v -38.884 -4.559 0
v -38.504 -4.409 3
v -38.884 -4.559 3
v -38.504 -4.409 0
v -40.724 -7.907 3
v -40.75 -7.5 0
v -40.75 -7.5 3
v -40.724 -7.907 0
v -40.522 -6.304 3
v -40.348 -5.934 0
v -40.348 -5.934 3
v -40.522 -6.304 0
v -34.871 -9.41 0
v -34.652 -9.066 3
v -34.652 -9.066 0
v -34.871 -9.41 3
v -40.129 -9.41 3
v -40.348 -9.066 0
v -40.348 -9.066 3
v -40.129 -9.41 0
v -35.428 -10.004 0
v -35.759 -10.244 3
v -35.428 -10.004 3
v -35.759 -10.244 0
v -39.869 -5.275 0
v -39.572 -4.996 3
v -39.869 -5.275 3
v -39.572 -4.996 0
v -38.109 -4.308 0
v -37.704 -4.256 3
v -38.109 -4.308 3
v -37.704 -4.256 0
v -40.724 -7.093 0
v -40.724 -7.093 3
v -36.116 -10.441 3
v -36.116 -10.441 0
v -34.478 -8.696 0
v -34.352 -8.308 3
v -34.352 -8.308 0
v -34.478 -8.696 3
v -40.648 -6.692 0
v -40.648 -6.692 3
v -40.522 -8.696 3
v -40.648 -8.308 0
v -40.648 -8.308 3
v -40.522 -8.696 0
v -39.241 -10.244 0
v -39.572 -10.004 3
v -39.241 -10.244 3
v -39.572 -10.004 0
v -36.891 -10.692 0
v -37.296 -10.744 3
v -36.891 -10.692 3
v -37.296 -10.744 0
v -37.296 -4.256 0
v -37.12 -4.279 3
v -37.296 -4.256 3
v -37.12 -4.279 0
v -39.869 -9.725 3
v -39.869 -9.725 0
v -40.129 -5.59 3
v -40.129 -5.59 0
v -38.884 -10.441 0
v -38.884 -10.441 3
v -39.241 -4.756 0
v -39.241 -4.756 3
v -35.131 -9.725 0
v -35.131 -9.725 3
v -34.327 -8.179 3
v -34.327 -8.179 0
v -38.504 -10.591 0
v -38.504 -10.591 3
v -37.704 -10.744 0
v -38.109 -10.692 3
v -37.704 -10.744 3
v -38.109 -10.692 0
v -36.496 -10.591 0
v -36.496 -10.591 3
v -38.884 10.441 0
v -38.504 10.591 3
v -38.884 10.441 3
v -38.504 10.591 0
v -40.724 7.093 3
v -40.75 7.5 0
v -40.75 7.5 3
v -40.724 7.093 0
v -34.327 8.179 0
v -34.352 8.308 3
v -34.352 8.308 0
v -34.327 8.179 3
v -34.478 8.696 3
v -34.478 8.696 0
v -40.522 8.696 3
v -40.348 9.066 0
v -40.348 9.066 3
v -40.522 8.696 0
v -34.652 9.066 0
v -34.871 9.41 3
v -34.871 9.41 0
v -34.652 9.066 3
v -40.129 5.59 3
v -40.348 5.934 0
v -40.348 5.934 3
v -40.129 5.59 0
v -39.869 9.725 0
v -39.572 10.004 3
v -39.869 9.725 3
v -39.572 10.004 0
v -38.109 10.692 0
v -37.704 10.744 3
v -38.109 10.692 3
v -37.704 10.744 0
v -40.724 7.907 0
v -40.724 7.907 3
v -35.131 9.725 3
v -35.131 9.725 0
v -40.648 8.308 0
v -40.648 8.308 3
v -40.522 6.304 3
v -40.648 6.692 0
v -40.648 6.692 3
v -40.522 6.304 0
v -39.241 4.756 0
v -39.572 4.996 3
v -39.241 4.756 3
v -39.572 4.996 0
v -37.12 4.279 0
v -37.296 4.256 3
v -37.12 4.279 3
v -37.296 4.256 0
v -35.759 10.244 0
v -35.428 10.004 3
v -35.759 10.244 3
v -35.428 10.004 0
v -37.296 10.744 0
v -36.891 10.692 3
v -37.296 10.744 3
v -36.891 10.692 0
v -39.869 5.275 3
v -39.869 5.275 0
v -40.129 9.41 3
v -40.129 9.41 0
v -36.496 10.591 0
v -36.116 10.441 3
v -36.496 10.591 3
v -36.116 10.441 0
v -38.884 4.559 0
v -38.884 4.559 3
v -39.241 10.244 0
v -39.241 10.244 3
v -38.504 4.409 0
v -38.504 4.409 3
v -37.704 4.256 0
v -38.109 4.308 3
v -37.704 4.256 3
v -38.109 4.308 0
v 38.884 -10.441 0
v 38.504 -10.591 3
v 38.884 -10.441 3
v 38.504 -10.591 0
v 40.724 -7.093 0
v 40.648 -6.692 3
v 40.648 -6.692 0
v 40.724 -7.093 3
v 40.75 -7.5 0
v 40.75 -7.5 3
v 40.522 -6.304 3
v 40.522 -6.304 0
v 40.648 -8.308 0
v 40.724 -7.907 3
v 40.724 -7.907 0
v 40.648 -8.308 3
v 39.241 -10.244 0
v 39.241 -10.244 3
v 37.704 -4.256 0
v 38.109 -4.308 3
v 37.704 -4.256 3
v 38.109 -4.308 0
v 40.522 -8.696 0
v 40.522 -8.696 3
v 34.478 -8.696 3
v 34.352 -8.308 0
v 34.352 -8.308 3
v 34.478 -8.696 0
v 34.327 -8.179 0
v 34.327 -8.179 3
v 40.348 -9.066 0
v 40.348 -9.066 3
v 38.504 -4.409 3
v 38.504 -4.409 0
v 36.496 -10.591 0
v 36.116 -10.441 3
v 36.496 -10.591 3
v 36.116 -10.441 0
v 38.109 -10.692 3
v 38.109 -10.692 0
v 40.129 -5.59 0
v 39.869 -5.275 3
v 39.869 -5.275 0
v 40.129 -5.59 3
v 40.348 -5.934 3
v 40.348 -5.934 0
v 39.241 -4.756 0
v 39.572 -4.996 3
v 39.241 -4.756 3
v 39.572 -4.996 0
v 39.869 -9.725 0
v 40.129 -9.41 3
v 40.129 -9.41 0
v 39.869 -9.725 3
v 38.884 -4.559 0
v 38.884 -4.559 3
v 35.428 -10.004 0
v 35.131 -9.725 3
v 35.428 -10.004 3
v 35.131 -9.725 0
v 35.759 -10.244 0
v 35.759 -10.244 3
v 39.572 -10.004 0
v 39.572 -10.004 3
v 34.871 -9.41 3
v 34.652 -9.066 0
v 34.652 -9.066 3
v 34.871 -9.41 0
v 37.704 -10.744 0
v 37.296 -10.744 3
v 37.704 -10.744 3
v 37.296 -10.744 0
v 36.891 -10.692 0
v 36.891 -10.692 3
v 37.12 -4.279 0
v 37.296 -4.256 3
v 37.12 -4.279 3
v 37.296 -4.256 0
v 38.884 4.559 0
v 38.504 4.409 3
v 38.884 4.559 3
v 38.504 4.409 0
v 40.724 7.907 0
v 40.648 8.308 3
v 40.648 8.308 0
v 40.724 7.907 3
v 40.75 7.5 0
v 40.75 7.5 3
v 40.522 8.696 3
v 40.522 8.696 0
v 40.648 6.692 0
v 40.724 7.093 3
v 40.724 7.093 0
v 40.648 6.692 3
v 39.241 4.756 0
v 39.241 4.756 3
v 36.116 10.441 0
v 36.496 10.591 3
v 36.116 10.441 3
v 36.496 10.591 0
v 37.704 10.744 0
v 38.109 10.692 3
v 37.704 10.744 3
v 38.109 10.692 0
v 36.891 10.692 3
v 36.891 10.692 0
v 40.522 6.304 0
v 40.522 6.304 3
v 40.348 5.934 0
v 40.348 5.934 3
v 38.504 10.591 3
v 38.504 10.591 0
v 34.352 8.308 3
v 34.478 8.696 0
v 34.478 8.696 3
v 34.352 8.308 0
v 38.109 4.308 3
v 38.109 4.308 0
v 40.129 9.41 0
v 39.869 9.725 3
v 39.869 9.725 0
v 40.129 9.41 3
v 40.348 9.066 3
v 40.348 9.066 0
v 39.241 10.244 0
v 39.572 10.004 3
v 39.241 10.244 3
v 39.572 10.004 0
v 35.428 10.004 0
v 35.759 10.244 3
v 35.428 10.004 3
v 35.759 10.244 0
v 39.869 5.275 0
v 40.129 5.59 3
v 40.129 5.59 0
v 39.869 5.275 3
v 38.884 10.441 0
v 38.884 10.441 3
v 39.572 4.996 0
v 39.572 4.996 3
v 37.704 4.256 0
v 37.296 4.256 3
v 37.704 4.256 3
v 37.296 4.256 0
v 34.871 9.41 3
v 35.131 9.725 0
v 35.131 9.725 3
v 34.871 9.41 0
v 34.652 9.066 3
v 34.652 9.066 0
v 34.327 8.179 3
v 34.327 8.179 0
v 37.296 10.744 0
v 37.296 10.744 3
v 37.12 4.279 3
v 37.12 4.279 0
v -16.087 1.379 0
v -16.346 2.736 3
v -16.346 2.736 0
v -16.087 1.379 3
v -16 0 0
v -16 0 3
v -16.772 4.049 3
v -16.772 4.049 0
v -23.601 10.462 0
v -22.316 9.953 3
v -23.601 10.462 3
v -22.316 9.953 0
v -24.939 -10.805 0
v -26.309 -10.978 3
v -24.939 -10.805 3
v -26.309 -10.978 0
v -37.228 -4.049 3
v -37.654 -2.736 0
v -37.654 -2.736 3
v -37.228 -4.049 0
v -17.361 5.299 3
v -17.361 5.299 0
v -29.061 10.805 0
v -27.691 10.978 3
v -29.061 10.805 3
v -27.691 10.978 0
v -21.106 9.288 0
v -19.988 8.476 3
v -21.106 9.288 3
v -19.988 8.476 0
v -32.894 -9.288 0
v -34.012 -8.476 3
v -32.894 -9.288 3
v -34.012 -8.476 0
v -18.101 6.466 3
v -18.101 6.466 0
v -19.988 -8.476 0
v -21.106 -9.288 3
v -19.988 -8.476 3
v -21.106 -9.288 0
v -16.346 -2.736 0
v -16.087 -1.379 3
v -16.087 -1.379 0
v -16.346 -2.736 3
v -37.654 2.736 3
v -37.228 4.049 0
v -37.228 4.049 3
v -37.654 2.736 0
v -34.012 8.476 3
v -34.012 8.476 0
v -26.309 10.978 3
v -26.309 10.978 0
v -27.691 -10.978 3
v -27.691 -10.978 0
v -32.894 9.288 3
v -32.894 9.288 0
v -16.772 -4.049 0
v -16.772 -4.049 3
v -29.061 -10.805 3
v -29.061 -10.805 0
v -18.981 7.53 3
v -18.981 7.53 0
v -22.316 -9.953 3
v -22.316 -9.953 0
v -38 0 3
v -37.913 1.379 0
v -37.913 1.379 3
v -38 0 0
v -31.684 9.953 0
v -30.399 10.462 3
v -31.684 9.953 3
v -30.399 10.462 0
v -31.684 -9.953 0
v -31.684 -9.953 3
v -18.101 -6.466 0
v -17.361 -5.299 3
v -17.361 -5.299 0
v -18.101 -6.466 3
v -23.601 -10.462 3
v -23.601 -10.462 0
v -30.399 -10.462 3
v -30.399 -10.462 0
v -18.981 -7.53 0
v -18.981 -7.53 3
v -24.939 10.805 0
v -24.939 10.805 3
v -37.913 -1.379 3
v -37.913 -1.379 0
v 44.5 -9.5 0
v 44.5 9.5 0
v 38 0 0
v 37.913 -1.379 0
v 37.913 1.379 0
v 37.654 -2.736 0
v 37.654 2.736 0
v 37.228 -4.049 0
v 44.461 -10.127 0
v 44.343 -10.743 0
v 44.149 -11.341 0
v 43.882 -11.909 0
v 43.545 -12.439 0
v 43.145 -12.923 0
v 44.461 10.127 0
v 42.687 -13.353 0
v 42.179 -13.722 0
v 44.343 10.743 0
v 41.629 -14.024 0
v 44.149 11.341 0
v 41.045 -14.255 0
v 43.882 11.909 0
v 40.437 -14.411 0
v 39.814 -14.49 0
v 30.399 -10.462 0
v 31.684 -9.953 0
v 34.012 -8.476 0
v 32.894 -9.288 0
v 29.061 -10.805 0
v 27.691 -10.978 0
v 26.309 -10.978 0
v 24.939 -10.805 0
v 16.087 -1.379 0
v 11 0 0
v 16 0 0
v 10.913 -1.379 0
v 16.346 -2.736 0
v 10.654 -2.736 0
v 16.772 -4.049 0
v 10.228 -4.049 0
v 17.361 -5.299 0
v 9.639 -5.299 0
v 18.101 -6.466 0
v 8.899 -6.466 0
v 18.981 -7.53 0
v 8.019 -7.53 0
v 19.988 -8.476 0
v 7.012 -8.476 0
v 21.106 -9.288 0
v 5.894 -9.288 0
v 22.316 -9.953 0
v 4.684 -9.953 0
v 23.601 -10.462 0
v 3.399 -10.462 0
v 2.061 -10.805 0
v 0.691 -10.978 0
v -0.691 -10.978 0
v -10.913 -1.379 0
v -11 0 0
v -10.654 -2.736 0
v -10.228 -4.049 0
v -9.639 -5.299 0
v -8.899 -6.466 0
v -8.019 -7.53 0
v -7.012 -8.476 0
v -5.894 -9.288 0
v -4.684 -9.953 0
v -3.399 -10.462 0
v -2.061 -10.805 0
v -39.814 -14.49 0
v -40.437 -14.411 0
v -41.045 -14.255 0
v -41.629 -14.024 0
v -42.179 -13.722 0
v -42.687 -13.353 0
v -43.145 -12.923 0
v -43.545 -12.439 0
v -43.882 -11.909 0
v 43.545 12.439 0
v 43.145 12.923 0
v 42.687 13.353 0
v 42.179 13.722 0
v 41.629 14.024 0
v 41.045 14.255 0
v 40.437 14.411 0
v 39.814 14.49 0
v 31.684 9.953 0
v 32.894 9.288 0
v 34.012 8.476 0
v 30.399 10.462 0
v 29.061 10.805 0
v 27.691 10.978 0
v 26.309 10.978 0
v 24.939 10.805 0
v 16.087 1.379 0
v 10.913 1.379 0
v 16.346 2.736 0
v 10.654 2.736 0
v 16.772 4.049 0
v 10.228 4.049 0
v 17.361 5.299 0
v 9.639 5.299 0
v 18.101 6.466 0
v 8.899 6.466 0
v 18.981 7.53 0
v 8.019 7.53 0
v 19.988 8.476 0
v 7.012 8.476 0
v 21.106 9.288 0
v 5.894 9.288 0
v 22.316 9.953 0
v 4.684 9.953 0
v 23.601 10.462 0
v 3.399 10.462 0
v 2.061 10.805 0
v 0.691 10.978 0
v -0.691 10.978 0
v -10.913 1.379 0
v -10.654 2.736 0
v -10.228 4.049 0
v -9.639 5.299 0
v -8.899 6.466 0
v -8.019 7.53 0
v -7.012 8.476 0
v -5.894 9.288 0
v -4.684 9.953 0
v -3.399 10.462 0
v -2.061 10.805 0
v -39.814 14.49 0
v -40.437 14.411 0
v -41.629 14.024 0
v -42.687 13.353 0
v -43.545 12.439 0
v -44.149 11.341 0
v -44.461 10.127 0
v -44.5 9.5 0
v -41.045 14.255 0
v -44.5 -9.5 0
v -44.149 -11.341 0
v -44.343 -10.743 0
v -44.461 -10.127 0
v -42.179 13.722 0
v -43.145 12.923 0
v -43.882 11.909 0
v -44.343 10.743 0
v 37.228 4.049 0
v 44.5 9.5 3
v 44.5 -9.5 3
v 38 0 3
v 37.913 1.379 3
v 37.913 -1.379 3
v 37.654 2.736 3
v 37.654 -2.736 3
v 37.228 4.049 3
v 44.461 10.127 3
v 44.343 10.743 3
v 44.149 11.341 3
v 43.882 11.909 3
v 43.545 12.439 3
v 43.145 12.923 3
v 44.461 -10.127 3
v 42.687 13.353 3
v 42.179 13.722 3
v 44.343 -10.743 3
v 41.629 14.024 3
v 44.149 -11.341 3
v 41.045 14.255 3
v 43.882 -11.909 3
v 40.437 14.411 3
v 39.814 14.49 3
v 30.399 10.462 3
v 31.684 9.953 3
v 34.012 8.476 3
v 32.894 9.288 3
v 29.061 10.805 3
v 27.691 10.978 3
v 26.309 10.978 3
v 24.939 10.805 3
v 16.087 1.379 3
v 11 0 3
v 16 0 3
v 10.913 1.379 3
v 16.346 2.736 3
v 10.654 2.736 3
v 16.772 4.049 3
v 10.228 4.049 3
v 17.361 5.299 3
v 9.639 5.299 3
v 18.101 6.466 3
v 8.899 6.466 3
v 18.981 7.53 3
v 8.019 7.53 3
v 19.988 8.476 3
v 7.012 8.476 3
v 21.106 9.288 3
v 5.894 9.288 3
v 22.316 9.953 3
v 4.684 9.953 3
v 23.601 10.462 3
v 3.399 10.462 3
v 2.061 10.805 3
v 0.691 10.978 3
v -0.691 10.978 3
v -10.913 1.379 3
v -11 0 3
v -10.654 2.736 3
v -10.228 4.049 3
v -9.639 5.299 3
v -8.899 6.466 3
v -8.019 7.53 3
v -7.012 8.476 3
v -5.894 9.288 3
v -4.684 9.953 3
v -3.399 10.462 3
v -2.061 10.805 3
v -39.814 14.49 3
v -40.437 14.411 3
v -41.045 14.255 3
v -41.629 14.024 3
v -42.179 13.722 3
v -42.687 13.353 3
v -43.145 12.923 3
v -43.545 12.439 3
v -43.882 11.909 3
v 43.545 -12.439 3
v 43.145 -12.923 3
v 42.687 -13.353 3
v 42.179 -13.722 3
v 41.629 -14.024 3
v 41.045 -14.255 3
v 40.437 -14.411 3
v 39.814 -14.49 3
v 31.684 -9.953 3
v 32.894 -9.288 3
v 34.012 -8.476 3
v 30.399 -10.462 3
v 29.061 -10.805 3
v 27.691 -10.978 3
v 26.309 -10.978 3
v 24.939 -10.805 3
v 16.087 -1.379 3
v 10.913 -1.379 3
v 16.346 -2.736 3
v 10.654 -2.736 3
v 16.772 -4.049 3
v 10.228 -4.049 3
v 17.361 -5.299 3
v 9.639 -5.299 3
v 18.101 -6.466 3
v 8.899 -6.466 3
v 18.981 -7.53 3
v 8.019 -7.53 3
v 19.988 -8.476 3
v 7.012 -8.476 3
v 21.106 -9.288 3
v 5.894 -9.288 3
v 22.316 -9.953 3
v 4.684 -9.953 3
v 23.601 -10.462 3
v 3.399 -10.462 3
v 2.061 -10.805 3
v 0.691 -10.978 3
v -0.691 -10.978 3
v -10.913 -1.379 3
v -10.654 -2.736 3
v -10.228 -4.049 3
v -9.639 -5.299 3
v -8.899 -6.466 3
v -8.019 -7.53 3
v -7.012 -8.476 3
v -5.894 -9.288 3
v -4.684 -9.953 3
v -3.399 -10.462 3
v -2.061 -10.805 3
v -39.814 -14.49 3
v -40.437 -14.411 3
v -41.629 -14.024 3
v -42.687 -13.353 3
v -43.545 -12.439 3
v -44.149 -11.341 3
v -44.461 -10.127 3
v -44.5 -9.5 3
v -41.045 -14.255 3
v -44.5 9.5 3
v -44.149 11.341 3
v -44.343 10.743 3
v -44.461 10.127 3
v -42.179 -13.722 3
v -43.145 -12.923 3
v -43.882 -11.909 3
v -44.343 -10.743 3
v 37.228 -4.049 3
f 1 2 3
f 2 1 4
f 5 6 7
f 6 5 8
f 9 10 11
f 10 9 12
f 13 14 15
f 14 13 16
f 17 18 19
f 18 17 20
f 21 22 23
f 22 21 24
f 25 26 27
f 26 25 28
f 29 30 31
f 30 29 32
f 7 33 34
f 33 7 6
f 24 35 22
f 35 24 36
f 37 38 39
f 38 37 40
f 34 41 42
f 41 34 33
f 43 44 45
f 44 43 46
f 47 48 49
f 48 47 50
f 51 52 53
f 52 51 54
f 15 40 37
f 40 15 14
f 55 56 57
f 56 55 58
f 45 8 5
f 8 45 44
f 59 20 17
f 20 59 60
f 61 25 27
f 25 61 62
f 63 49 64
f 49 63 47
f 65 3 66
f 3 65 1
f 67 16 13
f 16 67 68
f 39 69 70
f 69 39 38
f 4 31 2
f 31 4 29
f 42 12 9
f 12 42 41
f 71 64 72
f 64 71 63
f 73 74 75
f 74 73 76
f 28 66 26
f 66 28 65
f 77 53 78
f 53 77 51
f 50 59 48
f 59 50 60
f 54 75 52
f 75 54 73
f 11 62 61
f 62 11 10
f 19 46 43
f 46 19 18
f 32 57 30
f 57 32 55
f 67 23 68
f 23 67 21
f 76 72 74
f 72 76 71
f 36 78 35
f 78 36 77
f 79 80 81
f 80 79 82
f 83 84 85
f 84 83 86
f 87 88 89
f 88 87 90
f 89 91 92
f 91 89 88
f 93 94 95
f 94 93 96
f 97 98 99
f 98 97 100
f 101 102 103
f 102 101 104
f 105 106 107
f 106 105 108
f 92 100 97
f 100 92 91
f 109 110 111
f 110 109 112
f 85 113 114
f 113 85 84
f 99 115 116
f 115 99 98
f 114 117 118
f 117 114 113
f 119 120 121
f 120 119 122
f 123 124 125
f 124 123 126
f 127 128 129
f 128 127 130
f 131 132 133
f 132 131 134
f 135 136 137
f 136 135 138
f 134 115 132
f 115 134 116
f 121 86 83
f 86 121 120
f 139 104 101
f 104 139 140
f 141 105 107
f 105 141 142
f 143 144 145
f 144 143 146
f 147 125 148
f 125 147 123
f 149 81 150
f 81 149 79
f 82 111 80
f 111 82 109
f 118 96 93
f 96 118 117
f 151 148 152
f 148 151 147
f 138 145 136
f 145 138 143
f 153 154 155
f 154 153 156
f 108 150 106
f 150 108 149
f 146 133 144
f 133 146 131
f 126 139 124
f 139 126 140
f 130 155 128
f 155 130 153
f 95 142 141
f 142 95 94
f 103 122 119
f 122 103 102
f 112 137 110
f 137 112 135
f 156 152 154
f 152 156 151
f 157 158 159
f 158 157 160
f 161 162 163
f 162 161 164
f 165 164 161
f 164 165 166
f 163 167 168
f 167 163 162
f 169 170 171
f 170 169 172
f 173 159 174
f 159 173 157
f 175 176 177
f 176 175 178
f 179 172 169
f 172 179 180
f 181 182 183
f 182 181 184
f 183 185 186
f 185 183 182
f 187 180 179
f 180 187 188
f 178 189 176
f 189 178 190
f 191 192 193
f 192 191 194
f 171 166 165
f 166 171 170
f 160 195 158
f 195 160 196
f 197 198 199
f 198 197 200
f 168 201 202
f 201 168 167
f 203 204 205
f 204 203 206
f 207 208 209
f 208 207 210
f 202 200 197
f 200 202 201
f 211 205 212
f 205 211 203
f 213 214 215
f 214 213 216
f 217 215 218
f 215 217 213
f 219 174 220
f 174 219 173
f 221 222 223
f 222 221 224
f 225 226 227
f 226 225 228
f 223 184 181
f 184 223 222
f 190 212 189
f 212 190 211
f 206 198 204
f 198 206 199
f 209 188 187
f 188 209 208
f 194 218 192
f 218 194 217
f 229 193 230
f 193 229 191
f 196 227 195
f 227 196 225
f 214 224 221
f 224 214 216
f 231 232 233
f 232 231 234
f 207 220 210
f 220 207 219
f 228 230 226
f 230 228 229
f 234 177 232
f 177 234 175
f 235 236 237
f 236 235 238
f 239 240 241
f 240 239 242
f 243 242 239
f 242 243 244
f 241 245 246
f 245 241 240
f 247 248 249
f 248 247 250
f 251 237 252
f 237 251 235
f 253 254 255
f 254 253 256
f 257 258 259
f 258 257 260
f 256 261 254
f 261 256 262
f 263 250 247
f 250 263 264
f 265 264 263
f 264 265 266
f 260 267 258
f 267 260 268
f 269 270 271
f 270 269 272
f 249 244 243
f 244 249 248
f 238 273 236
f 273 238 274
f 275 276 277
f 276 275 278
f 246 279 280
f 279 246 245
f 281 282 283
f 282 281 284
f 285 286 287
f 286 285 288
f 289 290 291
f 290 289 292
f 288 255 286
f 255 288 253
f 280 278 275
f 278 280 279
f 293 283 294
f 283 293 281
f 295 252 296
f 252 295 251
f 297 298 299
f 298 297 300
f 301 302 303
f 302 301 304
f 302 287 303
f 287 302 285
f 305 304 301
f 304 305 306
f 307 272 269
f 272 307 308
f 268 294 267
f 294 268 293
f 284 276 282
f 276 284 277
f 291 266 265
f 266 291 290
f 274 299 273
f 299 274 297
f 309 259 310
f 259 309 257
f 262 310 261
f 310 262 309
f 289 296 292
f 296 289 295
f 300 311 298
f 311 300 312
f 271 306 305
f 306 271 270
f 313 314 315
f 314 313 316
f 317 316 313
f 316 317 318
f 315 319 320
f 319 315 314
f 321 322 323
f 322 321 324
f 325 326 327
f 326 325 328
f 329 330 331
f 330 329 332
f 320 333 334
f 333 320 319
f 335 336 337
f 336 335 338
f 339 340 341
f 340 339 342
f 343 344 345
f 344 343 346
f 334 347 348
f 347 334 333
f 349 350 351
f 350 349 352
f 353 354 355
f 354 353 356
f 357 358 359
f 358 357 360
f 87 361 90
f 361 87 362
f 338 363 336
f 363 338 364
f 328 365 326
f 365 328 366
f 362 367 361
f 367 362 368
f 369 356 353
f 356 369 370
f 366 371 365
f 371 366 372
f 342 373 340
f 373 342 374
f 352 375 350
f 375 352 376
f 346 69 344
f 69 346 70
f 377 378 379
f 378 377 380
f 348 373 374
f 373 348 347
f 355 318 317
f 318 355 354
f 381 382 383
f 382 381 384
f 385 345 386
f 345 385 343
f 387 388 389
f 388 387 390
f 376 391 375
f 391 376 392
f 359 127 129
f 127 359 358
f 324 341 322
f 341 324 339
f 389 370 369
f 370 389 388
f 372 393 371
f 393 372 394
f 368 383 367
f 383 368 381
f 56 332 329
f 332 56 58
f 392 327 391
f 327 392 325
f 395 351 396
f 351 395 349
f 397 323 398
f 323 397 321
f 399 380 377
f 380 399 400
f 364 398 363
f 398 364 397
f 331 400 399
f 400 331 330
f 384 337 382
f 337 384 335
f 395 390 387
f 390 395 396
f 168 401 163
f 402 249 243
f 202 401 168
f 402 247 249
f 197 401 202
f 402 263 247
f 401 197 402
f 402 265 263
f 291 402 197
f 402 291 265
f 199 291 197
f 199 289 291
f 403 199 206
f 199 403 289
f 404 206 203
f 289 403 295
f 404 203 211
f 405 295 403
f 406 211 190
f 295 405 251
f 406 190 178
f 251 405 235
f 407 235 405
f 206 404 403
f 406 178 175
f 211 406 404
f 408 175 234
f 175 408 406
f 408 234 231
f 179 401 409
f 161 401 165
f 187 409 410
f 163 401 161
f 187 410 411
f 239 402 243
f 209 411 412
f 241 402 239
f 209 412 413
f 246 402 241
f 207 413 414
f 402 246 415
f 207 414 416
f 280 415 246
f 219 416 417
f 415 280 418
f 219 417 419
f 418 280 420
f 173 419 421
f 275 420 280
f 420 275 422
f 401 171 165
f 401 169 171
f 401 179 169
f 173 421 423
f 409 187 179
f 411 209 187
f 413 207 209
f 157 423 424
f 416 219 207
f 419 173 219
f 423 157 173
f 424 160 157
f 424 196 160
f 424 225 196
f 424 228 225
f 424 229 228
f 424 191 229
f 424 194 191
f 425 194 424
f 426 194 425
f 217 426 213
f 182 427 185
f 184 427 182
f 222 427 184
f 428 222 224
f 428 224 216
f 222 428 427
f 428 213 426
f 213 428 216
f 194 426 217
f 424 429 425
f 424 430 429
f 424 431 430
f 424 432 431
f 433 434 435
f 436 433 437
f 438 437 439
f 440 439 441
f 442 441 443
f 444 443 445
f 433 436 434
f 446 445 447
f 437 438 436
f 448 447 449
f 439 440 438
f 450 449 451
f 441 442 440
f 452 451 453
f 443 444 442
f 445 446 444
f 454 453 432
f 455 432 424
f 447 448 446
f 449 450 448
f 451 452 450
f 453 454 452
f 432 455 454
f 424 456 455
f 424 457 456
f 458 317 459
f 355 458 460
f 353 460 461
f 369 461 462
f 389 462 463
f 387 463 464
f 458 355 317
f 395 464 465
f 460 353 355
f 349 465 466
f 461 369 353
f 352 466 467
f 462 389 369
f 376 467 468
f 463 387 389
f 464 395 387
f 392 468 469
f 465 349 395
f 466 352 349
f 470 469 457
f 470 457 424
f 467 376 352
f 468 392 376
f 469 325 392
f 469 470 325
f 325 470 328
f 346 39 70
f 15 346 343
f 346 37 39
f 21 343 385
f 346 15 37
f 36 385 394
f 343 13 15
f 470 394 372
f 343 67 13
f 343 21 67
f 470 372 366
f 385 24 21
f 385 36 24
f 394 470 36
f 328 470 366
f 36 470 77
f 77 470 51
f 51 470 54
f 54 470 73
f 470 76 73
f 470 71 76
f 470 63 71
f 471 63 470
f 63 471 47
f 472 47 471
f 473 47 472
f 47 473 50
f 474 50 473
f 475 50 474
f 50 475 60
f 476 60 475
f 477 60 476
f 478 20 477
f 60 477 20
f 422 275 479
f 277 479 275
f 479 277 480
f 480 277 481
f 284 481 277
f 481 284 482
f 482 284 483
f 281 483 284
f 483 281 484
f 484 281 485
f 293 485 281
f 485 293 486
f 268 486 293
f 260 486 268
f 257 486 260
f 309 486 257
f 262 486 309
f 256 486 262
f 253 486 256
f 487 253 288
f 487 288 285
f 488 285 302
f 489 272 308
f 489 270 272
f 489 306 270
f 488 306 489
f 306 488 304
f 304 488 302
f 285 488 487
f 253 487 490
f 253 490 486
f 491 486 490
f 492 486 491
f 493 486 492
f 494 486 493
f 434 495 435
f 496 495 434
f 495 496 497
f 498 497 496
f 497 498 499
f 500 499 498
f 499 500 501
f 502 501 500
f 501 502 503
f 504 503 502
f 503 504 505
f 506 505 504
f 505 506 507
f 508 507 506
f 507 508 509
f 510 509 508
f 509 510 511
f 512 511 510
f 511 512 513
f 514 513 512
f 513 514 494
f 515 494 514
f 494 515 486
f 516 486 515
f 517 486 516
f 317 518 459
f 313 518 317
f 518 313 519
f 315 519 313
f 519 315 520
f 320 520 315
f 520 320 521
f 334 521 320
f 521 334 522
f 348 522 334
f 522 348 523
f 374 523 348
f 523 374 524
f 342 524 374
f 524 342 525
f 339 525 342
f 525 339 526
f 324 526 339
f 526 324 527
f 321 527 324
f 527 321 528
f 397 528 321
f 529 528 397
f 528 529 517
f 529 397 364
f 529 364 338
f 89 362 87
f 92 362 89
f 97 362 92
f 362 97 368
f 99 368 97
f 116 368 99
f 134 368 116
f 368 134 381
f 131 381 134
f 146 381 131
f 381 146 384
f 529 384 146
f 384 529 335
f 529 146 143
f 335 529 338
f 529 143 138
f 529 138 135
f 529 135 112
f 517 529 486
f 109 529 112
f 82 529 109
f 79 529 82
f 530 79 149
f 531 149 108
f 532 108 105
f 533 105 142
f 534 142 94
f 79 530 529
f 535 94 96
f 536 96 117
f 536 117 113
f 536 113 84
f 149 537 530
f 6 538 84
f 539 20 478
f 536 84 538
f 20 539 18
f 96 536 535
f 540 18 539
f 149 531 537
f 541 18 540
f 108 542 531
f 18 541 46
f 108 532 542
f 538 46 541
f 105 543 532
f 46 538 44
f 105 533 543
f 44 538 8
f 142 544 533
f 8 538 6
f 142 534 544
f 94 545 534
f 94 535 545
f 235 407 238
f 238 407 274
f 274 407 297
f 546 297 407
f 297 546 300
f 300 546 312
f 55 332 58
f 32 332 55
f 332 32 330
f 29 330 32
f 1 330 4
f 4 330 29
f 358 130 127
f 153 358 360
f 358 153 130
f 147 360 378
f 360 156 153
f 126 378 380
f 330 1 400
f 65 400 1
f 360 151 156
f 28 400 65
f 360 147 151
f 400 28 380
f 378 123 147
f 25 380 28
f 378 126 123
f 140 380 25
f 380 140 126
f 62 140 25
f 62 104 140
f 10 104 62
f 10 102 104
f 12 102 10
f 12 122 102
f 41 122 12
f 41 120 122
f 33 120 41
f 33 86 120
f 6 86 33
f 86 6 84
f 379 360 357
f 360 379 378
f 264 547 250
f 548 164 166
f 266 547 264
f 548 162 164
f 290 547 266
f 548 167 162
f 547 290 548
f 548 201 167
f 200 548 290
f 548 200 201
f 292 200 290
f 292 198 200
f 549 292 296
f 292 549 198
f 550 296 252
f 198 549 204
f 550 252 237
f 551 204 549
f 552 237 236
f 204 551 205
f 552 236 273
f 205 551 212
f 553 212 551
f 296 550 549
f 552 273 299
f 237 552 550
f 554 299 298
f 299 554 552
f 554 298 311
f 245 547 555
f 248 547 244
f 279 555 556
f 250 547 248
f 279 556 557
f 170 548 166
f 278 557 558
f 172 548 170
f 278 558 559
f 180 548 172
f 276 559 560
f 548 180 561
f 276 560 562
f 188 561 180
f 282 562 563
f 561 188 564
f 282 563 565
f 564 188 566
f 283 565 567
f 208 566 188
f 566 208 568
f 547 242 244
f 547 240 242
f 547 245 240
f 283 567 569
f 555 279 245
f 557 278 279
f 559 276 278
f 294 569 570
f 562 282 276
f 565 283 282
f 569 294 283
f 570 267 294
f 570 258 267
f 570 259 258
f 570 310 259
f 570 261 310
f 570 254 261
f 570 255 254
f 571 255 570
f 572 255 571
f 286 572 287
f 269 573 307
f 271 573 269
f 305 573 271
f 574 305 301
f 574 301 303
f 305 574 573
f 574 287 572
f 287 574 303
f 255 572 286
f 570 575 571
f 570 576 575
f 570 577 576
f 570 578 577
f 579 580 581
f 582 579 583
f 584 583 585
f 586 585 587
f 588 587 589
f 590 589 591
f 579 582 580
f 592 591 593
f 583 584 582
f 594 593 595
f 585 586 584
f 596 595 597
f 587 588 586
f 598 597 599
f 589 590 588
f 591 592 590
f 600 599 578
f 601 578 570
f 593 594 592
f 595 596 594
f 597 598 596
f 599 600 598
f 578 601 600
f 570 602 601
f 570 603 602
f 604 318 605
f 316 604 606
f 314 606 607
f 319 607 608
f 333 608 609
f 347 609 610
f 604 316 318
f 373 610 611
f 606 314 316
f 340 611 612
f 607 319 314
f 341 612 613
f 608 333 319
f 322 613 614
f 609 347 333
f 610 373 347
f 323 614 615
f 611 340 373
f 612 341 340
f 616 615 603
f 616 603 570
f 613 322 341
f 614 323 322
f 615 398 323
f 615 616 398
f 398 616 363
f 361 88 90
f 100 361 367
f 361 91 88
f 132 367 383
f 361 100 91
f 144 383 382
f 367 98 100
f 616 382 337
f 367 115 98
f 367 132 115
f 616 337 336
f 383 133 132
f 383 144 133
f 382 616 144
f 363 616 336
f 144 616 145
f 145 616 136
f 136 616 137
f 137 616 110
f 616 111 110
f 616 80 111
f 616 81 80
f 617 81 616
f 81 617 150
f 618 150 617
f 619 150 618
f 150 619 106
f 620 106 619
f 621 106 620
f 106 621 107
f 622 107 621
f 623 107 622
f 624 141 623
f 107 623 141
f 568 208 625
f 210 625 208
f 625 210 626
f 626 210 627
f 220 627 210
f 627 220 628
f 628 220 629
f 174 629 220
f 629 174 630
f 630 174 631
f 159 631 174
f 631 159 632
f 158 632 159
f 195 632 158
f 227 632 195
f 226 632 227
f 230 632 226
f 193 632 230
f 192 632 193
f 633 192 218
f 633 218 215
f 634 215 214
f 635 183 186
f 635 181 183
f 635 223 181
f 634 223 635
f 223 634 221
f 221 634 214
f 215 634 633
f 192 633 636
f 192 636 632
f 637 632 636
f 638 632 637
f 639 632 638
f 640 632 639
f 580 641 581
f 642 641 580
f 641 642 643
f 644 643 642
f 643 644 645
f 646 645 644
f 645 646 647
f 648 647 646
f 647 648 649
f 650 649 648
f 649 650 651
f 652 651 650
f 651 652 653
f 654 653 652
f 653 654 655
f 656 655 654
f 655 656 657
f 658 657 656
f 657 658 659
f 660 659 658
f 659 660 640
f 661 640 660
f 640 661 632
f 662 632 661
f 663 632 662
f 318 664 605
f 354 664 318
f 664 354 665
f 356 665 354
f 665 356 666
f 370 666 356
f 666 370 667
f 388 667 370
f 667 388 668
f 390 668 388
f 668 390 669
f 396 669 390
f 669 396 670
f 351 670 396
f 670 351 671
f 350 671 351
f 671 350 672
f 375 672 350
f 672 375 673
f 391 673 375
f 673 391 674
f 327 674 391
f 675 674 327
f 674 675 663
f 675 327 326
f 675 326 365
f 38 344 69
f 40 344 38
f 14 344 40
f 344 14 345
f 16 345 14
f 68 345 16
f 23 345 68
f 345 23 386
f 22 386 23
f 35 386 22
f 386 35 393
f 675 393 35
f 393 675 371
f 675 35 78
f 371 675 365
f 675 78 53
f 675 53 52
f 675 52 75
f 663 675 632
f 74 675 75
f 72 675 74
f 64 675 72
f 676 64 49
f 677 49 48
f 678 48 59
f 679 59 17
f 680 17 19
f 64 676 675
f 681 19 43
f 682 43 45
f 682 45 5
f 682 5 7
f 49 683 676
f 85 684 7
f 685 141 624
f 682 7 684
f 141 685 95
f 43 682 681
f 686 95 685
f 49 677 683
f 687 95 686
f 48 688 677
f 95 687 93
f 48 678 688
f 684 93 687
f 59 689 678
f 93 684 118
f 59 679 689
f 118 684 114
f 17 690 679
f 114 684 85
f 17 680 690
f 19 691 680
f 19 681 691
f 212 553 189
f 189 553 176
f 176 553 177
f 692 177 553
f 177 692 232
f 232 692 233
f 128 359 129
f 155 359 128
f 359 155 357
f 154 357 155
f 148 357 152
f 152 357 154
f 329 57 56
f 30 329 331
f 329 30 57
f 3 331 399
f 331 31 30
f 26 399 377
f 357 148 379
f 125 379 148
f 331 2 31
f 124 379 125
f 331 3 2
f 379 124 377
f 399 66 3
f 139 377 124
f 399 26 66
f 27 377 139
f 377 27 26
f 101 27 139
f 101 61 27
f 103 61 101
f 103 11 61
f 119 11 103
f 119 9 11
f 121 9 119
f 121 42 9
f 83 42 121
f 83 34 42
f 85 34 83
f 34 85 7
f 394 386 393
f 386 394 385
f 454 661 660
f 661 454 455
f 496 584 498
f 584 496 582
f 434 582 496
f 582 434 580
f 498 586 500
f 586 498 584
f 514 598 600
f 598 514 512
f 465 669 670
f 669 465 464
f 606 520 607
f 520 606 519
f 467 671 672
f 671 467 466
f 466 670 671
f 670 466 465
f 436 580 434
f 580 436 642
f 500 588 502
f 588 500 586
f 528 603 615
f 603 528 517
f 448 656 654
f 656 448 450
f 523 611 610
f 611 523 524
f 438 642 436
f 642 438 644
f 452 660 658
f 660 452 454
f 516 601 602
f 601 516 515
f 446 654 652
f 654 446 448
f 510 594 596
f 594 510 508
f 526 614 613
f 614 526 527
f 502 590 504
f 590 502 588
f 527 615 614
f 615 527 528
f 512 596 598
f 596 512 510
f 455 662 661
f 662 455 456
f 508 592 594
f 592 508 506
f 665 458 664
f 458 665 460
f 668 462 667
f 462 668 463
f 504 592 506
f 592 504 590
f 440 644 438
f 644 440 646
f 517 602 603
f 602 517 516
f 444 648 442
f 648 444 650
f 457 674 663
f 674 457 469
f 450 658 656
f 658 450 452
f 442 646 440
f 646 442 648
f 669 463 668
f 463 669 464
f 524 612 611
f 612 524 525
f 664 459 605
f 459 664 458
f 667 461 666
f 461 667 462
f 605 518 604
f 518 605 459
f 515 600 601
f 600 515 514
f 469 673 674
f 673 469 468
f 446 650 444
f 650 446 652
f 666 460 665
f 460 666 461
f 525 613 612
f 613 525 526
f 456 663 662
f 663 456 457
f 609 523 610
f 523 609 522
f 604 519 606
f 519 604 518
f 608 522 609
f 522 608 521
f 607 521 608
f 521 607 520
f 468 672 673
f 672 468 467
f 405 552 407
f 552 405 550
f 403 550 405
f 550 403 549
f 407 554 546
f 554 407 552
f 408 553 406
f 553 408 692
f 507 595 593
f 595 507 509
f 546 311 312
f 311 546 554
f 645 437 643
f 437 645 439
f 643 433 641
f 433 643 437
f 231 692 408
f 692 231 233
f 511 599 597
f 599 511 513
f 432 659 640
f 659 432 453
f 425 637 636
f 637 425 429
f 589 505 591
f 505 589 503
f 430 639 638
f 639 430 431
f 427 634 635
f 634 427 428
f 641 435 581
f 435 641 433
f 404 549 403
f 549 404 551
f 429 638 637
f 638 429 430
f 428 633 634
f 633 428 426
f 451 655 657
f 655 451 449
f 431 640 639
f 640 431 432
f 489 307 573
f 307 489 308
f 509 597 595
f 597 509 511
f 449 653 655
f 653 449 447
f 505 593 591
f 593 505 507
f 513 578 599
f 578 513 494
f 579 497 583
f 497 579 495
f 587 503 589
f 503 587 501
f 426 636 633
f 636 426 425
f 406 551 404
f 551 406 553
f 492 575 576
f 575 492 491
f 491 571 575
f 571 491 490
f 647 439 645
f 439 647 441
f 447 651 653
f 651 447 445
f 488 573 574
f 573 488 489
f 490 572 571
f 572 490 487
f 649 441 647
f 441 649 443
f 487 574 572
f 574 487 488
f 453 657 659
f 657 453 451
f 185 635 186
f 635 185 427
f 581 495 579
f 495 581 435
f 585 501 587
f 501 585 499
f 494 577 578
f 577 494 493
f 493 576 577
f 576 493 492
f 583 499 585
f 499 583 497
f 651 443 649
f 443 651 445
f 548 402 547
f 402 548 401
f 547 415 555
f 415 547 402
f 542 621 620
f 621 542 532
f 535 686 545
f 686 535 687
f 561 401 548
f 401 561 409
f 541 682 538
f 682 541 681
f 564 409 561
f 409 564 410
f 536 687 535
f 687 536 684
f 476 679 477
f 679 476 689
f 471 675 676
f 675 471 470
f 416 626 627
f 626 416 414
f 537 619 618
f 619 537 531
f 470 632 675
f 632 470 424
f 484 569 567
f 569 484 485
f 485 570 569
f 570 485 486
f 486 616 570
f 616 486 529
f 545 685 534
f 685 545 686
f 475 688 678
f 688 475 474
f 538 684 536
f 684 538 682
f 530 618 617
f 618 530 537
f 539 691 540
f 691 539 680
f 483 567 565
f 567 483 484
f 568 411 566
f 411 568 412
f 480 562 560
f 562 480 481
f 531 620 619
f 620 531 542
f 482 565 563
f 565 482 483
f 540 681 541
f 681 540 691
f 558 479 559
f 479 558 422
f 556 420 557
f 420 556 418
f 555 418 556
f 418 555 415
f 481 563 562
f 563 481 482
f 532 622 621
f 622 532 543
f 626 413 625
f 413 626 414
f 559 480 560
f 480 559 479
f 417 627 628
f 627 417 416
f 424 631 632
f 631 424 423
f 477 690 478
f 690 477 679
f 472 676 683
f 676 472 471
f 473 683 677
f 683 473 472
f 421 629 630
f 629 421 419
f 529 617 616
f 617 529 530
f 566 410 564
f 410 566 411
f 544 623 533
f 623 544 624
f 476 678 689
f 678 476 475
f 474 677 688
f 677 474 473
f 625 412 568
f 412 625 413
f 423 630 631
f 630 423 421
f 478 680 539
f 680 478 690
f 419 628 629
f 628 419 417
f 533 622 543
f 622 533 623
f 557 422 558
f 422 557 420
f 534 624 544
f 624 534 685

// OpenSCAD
$fn = 50;


difference() {
	union() {
		hull() {
			translate(v = [-39.5000000000, 9.5000000000, 0]) {
				cylinder(h = 3, r = 5);
			}
			translate(v = [39.5000000000, 9.5000000000, 0]) {
				cylinder(h = 3, r = 5);
			}
			translate(v = [-39.5000000000, -9.5000000000, 0]) {
				cylinder(h = 3, r = 5);
			}
			translate(v = [39.5000000000, -9.5000000000, 0]) {
				cylinder(h = 3, r = 5);
			}
		}
	}
	union() {
		#translate(v = [-37.5000000000, -7.5000000000, -100.0000000000]) {
			cylinder(h = 200, r = 3.2500000000);
		}
		#translate(v = [-37.5000000000, 7.5000000000, -100.0000000000]) {
			cylinder(h = 200, r = 3.2500000000);
		}
		#translate(v = [37.5000000000, -7.5000000000, -100.0000000000]) {
			cylinder(h = 200, r = 3.2500000000);
		}
		#translate(v = [37.5000000000, 7.5000000000, -100.0000000000]) {
			cylinder(h = 200, r = 3.2500000000);
		}
		#translate(v = [-27.0000000000, 0, 0]) {
			cylinder(h = 3, r = 11.0000000000);
		}
		#cylinder(h = 3, r = 11.0000000000);
		#translate(v = [27.0000000000, 0, 0]) {
			cylinder(h = 3, r = 11.0000000000);
		}
	}
}
